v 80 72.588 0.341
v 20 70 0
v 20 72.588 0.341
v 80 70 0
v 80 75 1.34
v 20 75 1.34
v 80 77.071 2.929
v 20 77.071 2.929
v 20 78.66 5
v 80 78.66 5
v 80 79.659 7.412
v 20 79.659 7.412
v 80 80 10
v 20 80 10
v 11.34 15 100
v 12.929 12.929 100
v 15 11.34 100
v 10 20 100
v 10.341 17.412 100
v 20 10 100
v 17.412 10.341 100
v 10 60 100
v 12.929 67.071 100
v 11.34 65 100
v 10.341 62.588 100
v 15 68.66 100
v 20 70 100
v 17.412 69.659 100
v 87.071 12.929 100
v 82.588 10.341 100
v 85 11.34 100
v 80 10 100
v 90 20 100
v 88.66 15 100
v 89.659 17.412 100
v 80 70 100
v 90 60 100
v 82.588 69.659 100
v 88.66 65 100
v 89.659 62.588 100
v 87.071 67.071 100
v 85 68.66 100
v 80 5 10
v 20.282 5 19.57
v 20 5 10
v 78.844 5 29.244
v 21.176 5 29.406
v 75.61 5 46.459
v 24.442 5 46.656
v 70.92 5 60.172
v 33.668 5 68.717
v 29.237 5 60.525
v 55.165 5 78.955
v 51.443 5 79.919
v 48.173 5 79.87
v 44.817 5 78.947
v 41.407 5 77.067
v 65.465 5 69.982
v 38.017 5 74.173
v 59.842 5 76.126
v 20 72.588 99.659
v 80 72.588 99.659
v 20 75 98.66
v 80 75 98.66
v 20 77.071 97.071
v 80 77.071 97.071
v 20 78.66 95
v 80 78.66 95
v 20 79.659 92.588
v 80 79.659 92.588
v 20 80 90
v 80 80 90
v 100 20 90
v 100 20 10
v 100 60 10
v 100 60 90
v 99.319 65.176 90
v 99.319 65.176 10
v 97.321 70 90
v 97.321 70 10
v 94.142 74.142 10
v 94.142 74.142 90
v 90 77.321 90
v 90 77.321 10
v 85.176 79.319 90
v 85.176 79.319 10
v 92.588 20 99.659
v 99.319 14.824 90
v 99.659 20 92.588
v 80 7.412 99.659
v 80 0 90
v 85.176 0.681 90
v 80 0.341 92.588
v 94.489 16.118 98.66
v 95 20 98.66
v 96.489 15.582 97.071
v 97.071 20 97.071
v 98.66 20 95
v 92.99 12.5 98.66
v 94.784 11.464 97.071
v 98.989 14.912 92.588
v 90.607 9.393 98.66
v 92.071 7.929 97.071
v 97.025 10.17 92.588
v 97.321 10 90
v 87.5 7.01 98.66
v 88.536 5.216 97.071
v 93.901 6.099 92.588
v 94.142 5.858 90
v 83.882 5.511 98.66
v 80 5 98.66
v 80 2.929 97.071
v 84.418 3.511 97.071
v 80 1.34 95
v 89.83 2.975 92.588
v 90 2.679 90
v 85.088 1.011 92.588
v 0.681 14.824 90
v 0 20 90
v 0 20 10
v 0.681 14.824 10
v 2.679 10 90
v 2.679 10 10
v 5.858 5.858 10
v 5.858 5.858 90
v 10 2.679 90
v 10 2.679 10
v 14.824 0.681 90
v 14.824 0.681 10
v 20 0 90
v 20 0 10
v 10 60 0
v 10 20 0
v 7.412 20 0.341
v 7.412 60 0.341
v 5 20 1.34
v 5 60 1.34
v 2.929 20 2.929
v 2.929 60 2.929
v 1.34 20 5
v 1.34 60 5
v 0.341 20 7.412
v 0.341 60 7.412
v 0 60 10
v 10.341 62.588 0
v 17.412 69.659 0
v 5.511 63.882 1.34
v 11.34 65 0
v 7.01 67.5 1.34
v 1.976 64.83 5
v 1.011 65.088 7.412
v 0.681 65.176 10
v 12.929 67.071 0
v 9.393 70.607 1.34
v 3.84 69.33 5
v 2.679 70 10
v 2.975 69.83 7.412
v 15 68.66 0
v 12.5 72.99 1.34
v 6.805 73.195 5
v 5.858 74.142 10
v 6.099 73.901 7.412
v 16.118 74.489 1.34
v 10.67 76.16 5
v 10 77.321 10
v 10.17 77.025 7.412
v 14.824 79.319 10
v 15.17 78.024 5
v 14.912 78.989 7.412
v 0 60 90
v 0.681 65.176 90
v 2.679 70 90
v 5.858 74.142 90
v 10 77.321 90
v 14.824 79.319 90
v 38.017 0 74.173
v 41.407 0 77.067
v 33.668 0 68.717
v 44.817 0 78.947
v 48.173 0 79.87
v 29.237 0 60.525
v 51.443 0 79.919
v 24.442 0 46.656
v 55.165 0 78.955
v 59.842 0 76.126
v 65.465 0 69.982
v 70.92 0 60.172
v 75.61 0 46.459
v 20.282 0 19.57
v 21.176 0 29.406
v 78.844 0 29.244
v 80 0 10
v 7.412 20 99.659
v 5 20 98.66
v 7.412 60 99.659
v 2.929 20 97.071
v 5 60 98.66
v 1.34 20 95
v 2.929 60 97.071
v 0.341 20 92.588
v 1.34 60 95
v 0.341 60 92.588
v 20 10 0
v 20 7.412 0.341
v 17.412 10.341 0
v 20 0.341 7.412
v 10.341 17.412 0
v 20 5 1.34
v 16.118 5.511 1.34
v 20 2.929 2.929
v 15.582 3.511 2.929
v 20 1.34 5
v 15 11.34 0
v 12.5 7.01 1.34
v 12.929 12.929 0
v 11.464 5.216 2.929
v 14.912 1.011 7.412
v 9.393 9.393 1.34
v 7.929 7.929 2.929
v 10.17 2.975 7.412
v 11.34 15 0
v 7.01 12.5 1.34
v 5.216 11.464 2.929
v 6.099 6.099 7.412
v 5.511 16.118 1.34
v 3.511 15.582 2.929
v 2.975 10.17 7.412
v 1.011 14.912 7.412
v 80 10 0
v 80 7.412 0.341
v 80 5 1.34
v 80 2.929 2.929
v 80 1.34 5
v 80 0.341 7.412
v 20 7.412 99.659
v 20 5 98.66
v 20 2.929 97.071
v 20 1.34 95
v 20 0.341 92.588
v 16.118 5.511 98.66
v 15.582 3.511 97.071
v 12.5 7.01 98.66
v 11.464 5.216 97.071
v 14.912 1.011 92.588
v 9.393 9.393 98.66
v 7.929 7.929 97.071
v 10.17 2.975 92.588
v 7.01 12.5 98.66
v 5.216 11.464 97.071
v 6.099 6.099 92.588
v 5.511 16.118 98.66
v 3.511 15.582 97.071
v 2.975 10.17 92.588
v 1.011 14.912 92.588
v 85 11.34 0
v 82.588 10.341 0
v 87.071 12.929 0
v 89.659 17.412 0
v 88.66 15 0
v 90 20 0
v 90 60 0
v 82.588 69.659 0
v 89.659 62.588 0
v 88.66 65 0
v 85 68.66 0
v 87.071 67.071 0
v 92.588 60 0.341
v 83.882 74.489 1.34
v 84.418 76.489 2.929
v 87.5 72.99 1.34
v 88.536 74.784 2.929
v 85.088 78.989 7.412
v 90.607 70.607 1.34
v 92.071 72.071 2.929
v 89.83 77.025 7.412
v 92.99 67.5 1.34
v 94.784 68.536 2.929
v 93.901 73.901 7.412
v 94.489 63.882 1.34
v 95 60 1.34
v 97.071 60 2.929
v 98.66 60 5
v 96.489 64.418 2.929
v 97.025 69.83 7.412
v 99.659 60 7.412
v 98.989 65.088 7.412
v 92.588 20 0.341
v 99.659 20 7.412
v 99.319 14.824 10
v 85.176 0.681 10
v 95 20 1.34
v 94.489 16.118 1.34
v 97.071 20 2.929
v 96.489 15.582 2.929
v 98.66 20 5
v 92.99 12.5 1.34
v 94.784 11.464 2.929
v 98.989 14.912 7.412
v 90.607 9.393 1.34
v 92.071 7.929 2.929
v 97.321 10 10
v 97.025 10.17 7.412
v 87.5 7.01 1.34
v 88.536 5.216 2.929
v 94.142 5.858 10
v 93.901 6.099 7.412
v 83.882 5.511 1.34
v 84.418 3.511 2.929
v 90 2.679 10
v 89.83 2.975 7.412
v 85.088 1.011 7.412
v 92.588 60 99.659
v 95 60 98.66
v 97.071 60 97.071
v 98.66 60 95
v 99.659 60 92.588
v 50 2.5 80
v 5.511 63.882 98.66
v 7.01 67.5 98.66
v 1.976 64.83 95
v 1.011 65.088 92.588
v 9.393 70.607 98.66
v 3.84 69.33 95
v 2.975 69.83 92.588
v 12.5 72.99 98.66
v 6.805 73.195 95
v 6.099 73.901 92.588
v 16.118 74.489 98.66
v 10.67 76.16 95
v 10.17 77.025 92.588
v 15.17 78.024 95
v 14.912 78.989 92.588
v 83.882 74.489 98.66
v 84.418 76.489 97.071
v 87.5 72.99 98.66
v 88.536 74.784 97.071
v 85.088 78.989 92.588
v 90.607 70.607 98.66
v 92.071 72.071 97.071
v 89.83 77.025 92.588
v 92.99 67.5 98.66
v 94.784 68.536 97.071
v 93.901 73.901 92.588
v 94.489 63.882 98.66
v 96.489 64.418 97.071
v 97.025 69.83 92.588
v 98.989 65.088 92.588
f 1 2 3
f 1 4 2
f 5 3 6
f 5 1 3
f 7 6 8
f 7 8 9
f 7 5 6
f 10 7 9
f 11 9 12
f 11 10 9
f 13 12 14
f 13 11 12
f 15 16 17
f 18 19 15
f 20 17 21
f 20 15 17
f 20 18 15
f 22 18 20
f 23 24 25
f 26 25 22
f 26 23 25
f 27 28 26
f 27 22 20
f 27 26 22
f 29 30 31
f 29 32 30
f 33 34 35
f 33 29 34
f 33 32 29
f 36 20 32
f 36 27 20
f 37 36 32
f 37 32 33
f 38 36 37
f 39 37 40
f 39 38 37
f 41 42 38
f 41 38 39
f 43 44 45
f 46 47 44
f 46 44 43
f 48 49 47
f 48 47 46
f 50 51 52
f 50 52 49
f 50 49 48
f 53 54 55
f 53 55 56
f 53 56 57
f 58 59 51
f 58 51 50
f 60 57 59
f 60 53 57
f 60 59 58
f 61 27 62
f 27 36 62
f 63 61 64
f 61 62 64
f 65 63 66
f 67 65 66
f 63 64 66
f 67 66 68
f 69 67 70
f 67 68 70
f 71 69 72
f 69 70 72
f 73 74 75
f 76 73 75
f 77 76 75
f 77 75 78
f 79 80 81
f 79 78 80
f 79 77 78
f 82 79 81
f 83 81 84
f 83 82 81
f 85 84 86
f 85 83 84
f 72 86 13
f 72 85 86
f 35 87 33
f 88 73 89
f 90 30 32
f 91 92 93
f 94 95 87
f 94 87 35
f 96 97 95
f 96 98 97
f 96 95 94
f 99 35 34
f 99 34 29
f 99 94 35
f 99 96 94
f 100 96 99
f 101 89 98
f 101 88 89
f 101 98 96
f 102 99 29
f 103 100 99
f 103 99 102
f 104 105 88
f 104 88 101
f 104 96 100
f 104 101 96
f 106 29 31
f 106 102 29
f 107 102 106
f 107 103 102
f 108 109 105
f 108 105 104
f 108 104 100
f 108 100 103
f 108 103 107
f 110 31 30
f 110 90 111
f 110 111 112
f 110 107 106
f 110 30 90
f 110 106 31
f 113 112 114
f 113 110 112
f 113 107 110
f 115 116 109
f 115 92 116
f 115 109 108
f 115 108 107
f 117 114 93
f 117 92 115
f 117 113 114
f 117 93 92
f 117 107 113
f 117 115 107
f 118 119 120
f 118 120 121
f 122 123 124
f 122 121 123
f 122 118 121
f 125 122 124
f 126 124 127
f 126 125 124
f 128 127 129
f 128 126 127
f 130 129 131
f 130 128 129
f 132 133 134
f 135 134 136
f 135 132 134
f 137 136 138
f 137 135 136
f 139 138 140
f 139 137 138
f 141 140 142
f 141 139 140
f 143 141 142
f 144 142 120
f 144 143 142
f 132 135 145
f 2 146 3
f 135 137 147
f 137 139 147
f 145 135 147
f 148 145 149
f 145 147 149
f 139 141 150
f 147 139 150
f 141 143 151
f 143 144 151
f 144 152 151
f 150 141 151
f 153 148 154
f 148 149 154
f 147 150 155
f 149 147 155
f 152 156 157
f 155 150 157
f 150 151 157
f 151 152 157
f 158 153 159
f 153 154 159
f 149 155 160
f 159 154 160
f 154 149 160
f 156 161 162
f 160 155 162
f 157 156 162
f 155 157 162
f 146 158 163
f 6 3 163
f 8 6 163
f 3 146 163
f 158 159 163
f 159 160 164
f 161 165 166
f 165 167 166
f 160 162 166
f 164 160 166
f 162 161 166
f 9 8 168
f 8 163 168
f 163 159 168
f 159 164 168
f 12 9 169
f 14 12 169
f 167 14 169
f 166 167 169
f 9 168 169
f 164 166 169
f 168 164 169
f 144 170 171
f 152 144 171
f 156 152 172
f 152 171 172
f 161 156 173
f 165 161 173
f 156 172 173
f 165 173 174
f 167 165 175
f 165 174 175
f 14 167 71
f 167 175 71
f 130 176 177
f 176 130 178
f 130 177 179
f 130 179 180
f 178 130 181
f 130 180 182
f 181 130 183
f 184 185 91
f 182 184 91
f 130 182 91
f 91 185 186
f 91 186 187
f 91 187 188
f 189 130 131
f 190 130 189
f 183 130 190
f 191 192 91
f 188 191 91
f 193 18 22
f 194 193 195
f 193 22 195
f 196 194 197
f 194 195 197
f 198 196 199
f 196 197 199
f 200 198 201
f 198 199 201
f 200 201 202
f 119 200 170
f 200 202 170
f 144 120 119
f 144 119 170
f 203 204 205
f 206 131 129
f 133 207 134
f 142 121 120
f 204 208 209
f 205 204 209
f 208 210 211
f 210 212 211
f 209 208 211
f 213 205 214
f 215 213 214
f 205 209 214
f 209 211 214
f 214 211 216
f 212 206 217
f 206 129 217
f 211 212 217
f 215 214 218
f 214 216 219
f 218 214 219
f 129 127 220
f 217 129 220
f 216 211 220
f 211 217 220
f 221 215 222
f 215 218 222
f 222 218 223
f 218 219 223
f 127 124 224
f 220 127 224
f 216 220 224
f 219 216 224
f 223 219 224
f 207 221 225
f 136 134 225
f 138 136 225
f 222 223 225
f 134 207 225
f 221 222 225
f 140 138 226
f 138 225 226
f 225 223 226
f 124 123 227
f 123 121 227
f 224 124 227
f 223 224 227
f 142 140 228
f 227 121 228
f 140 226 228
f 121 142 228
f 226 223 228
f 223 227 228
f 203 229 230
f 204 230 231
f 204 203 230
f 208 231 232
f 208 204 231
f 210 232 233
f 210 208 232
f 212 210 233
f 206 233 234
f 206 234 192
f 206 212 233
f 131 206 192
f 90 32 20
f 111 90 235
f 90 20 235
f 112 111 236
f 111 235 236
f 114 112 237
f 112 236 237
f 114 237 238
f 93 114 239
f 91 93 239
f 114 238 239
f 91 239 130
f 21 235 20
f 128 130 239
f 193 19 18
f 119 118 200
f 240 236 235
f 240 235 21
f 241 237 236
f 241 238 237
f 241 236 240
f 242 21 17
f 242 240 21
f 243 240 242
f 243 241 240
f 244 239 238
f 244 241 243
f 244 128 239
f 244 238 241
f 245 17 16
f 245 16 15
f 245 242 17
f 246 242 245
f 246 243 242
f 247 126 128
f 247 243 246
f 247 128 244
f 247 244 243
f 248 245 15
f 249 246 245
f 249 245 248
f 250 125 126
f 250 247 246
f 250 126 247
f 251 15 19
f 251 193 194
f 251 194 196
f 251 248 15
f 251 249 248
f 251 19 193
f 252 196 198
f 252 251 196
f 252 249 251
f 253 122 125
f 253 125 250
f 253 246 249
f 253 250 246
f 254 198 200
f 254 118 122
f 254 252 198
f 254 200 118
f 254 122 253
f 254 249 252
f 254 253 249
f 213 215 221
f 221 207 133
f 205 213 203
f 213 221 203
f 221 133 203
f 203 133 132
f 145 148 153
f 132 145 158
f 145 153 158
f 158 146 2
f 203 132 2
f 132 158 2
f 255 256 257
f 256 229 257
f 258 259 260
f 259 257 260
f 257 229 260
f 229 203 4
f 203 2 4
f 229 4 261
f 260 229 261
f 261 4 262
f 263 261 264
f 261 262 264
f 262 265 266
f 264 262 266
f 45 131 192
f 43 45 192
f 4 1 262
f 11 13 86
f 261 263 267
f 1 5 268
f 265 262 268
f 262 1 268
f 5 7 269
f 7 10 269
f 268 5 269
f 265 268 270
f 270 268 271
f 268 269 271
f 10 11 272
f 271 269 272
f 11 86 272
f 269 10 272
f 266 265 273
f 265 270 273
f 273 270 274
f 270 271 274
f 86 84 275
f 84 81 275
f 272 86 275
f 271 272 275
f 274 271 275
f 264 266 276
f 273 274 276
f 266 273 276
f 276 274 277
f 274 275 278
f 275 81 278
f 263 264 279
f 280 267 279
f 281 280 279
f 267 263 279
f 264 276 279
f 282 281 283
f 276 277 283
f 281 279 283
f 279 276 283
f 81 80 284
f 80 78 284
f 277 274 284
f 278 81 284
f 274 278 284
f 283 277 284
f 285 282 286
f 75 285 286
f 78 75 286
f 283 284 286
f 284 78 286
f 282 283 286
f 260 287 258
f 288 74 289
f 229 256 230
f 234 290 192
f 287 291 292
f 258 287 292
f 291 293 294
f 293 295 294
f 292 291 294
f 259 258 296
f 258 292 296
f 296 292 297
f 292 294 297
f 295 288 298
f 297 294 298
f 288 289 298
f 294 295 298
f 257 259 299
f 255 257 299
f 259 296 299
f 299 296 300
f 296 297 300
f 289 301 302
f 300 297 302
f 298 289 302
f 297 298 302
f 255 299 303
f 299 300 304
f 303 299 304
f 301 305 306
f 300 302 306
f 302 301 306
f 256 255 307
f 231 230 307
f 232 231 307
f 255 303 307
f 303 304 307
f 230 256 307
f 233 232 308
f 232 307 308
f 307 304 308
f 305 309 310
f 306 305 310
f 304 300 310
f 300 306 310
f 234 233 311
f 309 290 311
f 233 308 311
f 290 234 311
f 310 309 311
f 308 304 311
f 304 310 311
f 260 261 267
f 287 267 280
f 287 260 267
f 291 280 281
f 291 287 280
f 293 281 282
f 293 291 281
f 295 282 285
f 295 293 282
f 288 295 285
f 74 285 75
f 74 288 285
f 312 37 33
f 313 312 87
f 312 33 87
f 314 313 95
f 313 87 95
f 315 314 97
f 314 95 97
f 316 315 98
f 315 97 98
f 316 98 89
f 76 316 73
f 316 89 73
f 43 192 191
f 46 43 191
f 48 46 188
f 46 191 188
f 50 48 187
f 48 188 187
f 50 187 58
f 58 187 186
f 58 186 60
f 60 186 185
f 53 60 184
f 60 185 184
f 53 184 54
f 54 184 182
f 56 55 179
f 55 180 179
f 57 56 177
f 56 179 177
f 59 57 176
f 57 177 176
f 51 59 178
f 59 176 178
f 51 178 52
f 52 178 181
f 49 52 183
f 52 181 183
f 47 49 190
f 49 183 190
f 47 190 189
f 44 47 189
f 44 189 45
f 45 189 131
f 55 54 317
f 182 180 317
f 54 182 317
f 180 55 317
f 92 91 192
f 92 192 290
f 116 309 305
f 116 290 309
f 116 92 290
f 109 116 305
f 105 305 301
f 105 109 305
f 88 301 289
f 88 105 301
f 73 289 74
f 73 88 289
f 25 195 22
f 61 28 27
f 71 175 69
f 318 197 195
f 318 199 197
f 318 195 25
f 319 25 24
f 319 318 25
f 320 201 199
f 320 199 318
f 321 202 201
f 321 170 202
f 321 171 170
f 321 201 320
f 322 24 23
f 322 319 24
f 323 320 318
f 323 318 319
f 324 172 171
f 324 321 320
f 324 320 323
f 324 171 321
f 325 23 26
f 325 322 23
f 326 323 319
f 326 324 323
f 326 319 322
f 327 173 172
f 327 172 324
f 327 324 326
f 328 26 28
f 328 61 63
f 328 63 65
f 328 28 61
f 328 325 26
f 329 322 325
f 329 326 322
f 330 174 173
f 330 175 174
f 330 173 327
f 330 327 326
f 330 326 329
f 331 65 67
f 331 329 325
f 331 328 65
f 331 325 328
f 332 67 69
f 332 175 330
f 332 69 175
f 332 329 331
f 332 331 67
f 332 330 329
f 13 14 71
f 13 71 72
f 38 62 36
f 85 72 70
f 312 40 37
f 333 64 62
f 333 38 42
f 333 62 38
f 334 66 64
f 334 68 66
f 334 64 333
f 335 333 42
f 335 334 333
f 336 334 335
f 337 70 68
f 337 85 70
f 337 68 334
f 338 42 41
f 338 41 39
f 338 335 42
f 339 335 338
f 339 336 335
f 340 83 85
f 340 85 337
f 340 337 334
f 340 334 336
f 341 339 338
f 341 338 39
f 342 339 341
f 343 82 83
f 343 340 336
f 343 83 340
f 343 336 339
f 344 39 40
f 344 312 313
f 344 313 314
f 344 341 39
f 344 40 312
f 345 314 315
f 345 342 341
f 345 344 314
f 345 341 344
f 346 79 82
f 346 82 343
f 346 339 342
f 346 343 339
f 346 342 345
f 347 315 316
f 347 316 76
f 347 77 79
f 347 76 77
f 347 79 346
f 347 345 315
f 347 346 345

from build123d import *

# Parameters (mm, degrees)
SKETCH_1_W          = 100
SKETCH_1_H          = 80
EXTRUDE_1_DEPTH     = 100
FILLET_1_R          = 20
FILLET_2_R          = 10
CUT_EXTRUDE_1_DEPTH = 5


with BuildPart() as part:
    # Эскиз1 → Бобышка-Вытянуть1 (new body)
    with BuildSketch(Plane.XY):
        with Locations((50, 40)):
            Rectangle(SKETCH_1_W, SKETCH_1_H)
    extrude(amount=EXTRUDE_1_DEPTH)

    # Скругление1
    fillet_1_edges = [part.edges().sort_by_distance(p)[0] for p in [
        (100, 0, 50),
        (0, 0, 50),
        (0, 80, 50),
        (100, 80, 50),
    ]]
    fillet(fillet_1_edges, radius=FILLET_1_R)

    # Скругление2
    fillet_2_edges = [part.edges().sort_by_distance(p)[0] for p in [
        (50, 80, 0),
        (50, 80, 100),
        (100, 40, 0),
        (50, 0, 0),
        (0, 40, 0),
        (5.857864376, 5.857864376, 0),
        (5.857864376, 74.142135624, 0),
        (94.142135624, 5.857864376, 0),
        (94.142135624, 74.142135624, 0),
        (100, 40, 100),
        (0, 40, 100),
        (50, 0, 100),
        (5.857864376, 5.857864376, 100),
        (5.857864376, 74.142135624, 100),
        (94.142135624, 5.857864376, 100),
        (94.142135624, 74.142135624, 100),
    ]]
    fillet(fillet_2_edges, radius=FILLET_2_R)

    # Эскиз2 → Вырез-Вытянуть1 (cut)
    with BuildSketch(Plane.XZ):
        with BuildLine():
            Line((20, 10), (80, 10))
            add(Edge.make_bspline(
                [(80, 10), (80, 80), (50, 80), (20, 80), (20, 10)],
                knots=[4.71238898, 4.71238898, 4.71238898, 6.283185307, 6.283185307, 7.853981634, 7.853981634, 7.853981634], degree=2, weights=[1, 0.707106781, 1, 0.707106781, 1]))
        make_face()
    extrude(amount=-CUT_EXTRUDE_1_DEPTH, mode=Mode.SUBTRACT)


solid = part.part
